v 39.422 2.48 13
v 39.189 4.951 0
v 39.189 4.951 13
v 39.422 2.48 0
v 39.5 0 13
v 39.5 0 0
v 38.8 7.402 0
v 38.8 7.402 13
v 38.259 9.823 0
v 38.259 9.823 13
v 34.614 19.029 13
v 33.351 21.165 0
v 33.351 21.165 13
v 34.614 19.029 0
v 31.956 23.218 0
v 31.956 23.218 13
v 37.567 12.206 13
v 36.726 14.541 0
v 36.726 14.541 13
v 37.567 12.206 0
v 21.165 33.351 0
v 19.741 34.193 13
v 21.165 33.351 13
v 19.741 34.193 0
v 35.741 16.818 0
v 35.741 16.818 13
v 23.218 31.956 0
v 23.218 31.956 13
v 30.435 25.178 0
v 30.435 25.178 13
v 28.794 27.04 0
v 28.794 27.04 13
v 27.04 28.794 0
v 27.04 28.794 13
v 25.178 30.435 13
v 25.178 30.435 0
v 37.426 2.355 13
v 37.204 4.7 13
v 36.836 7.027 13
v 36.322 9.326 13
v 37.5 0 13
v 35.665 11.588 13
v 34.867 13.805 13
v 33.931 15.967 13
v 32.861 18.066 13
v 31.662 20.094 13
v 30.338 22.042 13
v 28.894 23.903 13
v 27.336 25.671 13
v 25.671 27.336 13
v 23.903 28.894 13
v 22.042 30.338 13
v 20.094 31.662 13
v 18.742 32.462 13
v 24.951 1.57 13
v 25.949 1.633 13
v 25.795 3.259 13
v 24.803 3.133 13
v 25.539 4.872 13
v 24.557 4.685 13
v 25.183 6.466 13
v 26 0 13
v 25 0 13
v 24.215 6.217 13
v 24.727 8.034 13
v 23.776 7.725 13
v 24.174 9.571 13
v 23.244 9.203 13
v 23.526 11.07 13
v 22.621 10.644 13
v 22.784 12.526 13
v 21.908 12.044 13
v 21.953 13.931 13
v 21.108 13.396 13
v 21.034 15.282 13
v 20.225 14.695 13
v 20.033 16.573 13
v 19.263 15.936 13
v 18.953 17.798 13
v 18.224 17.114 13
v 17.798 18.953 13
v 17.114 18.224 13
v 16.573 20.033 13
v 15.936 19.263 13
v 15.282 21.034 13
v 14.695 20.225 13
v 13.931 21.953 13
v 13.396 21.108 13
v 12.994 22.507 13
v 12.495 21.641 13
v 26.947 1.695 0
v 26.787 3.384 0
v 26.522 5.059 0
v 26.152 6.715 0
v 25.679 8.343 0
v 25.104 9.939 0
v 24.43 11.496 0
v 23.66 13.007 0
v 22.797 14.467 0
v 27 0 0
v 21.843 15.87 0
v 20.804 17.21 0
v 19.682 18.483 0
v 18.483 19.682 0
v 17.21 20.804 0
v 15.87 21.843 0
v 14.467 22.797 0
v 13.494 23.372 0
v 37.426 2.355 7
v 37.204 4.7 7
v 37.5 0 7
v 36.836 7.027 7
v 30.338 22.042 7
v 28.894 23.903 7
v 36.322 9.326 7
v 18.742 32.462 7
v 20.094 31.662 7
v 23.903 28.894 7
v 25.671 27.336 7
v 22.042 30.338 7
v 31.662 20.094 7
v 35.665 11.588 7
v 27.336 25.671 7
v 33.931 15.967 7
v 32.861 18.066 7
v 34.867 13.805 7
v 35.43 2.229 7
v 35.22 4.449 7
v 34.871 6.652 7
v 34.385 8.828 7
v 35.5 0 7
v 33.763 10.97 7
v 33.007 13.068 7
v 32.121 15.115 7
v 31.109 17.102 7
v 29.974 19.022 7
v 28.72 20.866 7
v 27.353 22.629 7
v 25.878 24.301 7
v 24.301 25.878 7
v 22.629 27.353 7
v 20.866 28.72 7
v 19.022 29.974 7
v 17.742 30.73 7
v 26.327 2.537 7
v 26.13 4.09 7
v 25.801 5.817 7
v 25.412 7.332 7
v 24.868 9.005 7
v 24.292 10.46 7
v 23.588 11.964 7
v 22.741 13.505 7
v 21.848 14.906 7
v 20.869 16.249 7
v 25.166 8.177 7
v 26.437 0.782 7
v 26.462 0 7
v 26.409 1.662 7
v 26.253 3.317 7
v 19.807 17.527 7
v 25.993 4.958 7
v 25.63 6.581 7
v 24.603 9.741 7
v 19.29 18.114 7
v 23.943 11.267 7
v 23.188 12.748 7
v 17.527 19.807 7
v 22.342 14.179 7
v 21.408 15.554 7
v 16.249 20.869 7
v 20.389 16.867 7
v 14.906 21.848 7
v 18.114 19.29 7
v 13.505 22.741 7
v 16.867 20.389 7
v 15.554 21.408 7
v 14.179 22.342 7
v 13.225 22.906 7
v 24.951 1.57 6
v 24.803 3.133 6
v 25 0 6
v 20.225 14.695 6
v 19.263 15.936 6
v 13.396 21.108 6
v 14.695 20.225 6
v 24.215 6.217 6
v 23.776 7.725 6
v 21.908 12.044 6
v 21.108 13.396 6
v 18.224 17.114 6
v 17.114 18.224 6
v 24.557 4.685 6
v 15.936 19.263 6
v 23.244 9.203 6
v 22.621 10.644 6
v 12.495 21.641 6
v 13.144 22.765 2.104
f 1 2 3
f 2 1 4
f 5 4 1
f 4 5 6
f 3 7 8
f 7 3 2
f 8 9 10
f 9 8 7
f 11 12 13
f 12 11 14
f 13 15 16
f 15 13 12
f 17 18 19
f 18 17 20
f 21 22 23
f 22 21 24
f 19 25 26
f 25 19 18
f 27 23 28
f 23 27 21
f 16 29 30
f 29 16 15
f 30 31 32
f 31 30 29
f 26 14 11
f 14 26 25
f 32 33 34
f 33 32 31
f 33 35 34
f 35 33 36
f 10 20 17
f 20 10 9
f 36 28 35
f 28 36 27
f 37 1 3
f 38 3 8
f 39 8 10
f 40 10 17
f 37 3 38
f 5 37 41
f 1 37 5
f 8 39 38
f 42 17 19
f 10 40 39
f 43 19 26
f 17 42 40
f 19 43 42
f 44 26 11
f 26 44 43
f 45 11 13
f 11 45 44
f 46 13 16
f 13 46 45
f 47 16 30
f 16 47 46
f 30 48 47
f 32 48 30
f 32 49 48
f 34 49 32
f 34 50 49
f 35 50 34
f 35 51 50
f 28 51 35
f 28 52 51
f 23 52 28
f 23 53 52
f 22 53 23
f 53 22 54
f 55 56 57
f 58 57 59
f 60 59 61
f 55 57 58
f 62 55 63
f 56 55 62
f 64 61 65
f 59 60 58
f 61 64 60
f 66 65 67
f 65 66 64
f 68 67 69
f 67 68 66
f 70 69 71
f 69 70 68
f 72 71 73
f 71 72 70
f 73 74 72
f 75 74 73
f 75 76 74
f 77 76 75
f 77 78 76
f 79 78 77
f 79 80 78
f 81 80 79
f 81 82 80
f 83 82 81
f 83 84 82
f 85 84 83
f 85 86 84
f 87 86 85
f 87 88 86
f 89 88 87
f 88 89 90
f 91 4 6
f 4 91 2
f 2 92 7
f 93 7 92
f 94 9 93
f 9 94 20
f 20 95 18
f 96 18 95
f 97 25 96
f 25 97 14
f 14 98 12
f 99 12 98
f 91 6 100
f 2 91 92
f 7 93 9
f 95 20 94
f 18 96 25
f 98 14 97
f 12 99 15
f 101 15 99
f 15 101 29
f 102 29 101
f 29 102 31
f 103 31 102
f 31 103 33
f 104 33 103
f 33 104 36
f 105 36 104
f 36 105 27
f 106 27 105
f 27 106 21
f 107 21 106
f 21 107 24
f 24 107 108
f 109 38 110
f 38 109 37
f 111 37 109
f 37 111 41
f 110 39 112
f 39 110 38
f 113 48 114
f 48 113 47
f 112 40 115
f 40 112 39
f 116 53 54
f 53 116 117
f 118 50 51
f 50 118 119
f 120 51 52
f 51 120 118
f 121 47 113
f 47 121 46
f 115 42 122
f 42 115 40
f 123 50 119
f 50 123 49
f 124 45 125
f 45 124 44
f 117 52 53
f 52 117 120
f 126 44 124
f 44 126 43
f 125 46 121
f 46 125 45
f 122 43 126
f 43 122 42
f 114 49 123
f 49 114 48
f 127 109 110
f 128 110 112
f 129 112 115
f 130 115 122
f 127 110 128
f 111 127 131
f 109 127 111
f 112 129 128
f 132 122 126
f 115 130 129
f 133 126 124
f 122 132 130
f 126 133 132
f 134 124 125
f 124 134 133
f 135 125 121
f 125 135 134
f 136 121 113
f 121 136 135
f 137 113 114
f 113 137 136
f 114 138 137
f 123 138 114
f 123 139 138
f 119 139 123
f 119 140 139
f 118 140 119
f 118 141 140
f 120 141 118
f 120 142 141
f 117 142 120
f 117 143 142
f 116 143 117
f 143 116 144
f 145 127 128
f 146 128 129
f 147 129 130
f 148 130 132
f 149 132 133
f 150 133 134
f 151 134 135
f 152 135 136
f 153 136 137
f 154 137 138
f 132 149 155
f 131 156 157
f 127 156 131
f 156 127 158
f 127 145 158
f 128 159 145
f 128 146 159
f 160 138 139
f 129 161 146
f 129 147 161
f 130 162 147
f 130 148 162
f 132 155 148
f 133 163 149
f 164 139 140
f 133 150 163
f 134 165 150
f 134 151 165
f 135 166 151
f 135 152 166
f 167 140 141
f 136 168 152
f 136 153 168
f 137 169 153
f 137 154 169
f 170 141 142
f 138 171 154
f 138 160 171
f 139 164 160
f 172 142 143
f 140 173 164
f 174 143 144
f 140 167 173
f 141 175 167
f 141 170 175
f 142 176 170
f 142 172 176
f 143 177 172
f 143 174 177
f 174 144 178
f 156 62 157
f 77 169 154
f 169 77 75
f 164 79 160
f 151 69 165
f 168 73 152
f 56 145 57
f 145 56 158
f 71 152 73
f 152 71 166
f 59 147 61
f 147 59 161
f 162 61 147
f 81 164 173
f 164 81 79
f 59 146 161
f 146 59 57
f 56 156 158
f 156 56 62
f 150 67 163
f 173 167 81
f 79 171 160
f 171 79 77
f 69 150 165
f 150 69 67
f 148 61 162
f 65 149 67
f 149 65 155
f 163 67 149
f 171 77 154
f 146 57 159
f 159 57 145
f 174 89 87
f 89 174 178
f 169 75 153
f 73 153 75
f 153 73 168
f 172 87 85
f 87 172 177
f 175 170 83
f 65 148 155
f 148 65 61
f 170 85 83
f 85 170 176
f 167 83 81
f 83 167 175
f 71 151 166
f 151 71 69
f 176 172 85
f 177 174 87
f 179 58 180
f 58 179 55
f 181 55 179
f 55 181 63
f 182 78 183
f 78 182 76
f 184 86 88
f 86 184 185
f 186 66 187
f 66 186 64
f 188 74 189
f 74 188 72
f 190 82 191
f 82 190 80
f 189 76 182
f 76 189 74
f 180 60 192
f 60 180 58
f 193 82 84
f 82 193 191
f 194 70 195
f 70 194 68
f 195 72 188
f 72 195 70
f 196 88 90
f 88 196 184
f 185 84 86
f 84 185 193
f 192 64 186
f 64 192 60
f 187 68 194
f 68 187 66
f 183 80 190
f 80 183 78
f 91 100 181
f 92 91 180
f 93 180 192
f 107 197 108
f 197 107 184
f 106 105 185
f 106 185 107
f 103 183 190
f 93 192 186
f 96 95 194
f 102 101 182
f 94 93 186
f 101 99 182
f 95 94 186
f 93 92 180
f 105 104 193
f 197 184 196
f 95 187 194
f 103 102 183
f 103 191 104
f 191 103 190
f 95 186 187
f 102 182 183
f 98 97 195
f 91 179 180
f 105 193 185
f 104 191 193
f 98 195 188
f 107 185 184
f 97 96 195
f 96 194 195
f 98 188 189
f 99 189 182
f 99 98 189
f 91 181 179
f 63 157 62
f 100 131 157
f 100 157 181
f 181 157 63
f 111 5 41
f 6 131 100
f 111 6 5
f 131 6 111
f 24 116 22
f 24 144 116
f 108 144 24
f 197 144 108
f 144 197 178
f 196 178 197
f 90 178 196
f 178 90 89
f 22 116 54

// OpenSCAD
SPACER_HEIGHT = 7;
SPACER_TAB_HEIGHT = 6;
SPACER_WIDTH = 10.5;
SPACER_TAB_WIDTH = 2;

SPACER_ANGLE = 60;

SPACER_INNER_DIA = 50;
SPACER_OUTER_DIA = SPACER_INNER_DIA + SPACER_WIDTH * 2;

$fn = 100;


module spacer() {
    intersection() {
        difference() {
            union() {
                cylinder(d = SPACER_OUTER_DIA, h = SPACER_HEIGHT);
                cylinder(d1 = SPACER_INNER_DIA + SPACER_TAB_WIDTH * 2, d2 = SPACER_INNER_DIA + 2, h = SPACER_HEIGHT + SPACER_TAB_HEIGHT);

                difference() {
                    cylinder(d = SPACER_INNER_DIA + SPACER_TAB_WIDTH * 4 + SPACER_WIDTH * 2, h = SPACER_HEIGHT + SPACER_TAB_HEIGHT);


                    #translate([0, 0, SPACER_HEIGHT])
                    cylinder(d = SPACER_INNER_DIA + SPACER_TAB_WIDTH * 2 + SPACER_WIDTH * 2, h = SPACER_TAB_HEIGHT);
                }
            }
            #cylinder(d = SPACER_INNER_DIA, h = SPACER_HEIGHT + SPACER_TAB_HEIGHT);

            #cylinder(d1 = SPACER_INNER_DIA + SPACER_TAB_WIDTH * 2, d2 = SPACER_INNER_DIA + 0, h = SPACER_TAB_HEIGHT);
        }

        rotate_extrude(angle = SPACER_ANGLE)
        square([SPACER_OUTER_DIA, SPACER_HEIGHT + SPACER_TAB_HEIGHT]);
    }
}

spacer();
